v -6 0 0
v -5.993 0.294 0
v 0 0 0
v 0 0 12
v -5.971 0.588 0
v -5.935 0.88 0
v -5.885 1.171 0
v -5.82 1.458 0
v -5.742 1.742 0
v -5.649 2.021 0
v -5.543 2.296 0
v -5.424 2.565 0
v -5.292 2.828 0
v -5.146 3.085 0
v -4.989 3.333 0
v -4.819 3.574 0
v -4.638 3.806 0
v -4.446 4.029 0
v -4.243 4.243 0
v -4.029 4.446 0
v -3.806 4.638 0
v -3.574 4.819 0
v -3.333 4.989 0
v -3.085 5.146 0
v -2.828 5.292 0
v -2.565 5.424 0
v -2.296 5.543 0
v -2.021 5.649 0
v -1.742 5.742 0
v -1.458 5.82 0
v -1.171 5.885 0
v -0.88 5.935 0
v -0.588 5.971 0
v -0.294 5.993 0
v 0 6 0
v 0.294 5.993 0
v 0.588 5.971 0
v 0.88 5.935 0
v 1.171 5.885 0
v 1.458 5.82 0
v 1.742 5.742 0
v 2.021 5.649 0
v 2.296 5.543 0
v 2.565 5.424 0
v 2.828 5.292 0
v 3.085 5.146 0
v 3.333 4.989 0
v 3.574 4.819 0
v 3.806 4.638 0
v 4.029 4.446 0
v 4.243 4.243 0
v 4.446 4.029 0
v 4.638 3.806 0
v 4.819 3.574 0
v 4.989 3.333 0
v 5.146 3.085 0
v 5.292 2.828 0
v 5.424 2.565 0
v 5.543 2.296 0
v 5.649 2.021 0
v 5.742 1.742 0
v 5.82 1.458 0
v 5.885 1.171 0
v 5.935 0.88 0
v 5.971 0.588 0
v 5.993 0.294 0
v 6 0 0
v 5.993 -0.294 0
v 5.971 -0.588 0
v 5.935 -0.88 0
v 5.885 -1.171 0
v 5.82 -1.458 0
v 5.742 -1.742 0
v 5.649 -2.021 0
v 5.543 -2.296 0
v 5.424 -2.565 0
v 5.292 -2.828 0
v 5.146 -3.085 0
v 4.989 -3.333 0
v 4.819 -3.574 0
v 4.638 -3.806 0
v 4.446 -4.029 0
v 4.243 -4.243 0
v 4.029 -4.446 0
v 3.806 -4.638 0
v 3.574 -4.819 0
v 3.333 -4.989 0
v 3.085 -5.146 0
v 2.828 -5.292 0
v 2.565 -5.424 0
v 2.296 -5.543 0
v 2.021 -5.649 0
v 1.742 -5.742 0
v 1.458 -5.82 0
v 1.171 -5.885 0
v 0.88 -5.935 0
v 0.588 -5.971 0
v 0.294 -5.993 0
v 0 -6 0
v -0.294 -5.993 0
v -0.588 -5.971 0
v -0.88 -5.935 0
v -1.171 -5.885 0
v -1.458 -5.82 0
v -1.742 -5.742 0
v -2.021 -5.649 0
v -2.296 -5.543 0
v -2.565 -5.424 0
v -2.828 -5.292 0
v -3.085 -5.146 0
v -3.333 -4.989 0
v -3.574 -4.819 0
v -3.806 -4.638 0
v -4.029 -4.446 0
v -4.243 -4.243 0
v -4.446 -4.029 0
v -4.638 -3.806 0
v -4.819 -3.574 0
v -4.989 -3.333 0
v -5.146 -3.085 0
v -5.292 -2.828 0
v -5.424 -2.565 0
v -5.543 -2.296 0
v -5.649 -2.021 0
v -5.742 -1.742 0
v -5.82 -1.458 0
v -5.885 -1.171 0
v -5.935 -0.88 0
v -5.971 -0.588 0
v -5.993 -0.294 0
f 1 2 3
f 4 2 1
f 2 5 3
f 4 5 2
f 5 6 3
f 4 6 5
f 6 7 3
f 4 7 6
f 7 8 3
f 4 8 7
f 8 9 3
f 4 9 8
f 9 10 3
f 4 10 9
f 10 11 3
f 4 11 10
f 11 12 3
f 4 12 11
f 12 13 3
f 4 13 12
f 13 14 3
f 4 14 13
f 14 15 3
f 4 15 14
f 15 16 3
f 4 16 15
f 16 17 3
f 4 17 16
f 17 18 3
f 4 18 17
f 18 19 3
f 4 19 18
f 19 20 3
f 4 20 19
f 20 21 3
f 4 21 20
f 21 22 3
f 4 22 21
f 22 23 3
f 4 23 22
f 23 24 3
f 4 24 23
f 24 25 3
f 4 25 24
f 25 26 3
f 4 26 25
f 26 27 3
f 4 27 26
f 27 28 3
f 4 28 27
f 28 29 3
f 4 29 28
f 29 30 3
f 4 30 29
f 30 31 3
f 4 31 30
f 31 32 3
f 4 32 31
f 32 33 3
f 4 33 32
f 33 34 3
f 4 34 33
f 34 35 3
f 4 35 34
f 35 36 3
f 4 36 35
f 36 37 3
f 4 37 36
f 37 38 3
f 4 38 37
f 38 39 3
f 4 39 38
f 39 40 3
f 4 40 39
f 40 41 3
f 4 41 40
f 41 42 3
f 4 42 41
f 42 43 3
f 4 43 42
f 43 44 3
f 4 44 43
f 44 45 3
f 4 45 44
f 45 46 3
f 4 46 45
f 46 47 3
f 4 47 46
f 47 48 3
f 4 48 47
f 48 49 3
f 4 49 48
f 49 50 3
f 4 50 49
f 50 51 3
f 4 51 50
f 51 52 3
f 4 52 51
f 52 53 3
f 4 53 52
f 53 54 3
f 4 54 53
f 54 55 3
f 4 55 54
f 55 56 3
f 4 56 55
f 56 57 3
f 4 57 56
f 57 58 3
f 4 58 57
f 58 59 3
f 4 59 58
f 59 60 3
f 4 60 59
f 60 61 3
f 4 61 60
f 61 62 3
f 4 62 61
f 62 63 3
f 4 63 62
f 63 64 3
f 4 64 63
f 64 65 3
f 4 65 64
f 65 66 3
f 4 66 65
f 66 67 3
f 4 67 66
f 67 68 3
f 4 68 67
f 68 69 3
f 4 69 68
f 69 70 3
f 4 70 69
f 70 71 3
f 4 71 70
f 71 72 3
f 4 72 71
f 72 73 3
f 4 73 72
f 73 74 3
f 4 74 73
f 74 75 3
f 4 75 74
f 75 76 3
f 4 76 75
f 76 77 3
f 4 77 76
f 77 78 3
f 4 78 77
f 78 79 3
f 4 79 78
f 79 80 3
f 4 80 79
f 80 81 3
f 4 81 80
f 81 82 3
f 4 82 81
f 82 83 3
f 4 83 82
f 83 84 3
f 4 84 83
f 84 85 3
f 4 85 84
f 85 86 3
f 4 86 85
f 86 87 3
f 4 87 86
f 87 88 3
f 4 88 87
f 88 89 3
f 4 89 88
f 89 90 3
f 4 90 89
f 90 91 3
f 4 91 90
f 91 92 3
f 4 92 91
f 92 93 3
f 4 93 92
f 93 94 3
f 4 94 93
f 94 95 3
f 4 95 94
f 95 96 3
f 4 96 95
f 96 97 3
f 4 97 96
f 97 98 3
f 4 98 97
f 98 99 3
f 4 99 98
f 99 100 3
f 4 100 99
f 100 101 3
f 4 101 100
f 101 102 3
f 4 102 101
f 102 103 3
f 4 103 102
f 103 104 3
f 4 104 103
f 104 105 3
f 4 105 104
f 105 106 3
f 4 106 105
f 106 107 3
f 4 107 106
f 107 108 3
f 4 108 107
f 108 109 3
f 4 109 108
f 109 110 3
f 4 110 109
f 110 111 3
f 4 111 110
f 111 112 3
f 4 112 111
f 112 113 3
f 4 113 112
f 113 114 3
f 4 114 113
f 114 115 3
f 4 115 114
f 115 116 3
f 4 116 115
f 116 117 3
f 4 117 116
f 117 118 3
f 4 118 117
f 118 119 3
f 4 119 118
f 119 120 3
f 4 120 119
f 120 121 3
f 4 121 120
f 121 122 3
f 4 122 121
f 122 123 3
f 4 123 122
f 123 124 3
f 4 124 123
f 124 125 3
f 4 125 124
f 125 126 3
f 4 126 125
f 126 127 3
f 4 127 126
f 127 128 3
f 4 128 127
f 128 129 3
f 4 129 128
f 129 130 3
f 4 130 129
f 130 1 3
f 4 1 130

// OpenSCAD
// Auto-generated from tests/data/feature_fixtures_manifest.json
// fixture: revolve_triangle_profile
// fixture_type: revolve
// description: Triangle profile revolved around Z; generic Phase 1 cone-like revolve.
$fn = 96;

profile = [
    [0.000000, 0.000000],
    [6.000000, 0.000000],
    [0.000000, 12.000000]
];

rotate_extrude($fn=128) polygon(points=profile);
